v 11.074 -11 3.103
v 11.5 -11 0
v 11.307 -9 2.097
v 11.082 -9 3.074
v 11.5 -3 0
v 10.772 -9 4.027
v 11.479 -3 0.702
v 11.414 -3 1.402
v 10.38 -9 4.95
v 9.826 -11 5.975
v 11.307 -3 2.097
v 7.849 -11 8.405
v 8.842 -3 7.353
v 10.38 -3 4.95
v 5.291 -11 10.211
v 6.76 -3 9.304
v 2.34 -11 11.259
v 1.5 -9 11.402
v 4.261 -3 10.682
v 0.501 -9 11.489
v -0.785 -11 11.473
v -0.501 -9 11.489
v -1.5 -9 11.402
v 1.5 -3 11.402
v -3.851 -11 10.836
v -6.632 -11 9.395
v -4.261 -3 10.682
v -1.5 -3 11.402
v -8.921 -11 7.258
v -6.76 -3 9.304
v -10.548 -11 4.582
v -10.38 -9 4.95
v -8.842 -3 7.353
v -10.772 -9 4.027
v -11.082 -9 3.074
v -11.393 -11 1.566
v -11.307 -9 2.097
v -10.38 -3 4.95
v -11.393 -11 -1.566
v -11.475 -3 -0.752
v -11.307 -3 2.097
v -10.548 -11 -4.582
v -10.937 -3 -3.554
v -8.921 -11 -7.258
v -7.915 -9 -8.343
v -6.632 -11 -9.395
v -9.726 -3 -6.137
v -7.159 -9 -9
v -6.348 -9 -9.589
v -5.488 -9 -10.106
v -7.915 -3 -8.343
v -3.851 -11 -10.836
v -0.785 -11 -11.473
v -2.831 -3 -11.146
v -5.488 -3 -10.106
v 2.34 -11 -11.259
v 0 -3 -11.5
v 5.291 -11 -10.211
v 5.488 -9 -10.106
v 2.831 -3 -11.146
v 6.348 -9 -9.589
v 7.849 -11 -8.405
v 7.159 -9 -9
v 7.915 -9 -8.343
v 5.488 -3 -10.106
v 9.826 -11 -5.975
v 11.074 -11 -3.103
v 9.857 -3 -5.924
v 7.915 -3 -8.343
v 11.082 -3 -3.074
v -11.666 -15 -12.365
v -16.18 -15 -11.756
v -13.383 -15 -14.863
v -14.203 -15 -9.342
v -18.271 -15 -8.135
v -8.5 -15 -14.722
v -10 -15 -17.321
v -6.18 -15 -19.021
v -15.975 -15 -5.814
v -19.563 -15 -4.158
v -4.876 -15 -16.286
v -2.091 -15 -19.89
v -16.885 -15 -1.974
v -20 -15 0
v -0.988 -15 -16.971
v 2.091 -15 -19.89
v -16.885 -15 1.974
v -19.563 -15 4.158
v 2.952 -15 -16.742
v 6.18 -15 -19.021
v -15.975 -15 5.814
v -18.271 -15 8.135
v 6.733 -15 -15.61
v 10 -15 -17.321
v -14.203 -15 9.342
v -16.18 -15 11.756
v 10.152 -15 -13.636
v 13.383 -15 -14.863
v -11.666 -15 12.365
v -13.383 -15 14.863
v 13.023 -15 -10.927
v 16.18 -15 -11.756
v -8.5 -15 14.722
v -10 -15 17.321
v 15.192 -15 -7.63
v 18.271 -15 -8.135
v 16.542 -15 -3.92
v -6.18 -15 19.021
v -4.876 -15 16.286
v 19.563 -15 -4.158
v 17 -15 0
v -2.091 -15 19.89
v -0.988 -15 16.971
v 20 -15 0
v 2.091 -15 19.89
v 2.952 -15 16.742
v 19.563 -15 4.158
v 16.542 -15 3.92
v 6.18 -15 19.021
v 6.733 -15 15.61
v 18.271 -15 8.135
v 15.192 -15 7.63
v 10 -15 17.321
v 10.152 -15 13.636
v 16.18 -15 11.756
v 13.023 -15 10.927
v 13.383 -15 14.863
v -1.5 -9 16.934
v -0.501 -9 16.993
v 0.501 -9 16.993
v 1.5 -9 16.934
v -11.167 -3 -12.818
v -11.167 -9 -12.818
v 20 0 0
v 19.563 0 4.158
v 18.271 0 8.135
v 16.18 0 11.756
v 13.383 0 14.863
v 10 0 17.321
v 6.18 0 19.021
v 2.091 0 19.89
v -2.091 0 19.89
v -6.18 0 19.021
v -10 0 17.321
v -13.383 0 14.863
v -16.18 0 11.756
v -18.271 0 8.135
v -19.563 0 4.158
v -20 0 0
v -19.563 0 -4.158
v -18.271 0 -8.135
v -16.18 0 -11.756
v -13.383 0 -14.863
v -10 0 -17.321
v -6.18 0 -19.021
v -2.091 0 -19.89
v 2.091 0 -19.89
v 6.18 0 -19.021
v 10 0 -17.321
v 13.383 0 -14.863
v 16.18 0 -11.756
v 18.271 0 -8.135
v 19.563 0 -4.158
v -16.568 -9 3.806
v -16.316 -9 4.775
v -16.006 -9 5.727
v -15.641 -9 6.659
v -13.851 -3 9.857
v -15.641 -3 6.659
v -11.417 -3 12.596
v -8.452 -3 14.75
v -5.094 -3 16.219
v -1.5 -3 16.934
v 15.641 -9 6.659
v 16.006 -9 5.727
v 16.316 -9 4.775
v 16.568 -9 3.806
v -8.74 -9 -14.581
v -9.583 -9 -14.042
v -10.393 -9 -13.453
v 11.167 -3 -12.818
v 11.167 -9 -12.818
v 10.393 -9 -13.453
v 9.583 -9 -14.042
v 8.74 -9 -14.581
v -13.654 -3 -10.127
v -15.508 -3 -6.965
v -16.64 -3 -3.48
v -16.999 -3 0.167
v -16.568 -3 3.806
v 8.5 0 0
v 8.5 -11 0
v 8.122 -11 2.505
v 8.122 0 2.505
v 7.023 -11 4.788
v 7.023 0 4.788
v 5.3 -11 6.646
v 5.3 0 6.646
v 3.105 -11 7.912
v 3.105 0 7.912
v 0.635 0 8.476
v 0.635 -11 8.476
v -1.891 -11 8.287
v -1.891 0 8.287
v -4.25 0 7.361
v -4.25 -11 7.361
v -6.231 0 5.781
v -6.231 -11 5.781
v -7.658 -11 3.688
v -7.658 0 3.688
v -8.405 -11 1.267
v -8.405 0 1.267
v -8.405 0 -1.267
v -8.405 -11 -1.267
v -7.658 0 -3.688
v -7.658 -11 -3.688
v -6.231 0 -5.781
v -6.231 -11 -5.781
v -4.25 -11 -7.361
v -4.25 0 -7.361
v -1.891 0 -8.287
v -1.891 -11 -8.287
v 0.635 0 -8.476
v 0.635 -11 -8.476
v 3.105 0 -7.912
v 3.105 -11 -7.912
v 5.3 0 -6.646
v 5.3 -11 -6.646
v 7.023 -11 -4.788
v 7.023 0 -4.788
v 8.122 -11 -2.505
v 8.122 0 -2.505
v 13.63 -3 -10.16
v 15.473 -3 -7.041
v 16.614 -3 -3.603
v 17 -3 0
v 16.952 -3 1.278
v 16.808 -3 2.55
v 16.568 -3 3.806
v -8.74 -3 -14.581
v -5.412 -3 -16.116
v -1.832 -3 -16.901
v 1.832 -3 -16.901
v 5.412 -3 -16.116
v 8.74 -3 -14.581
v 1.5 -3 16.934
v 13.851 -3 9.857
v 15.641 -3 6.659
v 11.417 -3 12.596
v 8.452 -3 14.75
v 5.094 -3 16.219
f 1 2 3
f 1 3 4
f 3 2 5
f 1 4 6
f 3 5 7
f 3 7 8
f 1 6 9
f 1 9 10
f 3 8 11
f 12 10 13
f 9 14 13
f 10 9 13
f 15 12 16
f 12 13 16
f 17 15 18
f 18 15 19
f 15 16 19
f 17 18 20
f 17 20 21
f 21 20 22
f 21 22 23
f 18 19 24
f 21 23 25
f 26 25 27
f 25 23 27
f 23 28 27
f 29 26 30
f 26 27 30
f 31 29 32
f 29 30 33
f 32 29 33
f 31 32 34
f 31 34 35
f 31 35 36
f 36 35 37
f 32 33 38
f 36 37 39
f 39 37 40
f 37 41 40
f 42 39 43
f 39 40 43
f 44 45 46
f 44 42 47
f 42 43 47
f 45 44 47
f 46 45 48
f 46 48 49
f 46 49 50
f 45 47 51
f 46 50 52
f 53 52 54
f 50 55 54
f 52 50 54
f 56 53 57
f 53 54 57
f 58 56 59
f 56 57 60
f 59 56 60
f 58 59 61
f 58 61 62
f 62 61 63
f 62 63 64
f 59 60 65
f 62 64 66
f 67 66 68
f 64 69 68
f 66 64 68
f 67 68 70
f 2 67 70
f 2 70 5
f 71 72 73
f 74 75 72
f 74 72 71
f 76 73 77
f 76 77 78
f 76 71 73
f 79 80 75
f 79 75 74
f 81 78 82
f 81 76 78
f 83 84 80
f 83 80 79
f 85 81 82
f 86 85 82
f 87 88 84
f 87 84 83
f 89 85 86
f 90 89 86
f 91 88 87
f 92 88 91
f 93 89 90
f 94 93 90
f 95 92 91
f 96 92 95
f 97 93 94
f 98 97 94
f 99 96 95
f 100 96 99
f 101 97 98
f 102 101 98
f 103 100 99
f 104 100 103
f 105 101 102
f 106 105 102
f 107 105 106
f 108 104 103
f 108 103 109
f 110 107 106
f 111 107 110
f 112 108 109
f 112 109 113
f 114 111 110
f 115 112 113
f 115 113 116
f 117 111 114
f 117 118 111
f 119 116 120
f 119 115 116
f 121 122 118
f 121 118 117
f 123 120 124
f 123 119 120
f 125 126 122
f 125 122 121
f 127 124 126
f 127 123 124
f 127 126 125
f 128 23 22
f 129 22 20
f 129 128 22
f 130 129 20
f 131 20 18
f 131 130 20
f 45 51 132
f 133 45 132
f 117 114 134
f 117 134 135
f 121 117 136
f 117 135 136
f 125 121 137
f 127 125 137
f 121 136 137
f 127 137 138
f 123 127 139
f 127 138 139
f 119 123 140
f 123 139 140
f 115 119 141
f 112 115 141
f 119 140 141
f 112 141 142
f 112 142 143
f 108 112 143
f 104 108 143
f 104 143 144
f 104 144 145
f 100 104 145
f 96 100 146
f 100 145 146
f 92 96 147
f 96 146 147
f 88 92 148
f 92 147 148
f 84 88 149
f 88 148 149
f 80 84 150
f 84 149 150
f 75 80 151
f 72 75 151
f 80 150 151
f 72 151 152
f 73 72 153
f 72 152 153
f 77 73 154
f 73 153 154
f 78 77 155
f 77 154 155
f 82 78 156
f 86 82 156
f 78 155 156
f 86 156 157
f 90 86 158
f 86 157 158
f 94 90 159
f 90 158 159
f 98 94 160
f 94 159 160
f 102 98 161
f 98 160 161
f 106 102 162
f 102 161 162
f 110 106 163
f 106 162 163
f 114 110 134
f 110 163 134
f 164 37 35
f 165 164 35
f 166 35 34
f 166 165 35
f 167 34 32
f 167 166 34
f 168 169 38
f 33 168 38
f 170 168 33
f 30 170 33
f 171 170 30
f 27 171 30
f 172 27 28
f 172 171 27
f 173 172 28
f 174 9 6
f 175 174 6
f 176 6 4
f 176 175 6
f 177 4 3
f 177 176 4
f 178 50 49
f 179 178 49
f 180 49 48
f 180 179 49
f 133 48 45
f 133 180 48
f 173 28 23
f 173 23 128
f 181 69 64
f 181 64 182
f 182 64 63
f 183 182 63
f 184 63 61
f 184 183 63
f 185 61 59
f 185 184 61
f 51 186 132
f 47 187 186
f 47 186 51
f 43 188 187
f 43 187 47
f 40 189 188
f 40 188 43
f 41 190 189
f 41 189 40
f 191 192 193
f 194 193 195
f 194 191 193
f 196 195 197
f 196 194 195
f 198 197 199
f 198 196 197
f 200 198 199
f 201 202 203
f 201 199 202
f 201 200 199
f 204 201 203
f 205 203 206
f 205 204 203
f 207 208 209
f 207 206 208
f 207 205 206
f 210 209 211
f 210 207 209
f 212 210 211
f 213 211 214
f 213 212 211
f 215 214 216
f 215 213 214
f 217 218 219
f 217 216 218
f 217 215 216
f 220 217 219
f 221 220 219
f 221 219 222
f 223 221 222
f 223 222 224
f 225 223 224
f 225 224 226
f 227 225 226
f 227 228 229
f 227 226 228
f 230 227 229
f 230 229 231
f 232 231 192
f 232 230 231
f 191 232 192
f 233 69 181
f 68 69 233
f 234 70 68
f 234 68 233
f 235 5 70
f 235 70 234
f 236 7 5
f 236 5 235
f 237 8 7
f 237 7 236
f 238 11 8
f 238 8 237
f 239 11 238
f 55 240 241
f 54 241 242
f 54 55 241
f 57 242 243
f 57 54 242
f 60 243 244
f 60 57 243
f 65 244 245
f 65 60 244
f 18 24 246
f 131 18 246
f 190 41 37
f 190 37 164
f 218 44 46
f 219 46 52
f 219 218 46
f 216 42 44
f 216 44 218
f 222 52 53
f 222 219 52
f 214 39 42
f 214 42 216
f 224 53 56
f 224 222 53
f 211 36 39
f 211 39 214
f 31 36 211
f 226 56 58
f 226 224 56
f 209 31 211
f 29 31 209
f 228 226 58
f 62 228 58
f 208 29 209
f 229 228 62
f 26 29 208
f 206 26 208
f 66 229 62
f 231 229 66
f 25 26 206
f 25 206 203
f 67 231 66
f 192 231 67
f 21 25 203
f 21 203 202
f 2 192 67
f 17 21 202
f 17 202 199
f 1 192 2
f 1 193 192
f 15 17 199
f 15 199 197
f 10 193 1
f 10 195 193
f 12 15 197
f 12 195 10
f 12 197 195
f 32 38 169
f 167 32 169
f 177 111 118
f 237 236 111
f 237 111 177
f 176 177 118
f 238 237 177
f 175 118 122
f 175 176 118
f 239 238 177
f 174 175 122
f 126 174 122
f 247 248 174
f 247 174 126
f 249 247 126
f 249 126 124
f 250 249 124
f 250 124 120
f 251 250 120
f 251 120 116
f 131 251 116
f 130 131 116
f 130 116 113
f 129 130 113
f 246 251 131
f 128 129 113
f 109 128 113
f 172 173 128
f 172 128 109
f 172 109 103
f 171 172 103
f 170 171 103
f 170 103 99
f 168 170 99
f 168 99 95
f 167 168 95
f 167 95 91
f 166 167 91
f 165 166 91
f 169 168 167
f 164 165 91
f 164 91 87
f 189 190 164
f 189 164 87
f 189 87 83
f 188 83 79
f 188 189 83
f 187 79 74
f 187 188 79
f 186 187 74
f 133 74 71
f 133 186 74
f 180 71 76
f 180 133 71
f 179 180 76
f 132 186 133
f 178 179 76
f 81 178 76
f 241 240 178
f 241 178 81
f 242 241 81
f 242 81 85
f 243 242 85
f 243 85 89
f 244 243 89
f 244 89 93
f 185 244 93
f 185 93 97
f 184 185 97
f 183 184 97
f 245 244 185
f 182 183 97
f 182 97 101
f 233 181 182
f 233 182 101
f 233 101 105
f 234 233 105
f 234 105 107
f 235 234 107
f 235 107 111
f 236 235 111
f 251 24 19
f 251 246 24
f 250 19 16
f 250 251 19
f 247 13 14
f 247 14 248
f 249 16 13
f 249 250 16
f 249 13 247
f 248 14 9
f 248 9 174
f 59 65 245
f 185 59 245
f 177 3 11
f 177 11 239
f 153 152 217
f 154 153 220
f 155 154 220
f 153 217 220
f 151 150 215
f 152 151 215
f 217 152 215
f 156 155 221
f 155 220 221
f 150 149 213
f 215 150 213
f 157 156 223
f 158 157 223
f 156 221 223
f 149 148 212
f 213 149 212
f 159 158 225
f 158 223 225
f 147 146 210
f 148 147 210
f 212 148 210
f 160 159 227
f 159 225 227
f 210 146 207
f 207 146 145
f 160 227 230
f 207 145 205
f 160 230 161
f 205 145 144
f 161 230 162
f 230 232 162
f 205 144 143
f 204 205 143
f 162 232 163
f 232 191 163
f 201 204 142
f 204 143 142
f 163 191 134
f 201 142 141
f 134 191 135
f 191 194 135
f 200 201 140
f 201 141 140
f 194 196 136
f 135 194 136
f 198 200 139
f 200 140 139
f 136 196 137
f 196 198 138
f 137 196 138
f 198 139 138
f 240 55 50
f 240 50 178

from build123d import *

# Parameters (mm, degrees)
SKETCH_R           = 20
SKETCH_R_2         = 8.5
PAD_DEPTH          = 15
SKETCH001_R        = 17
SKETCH001_R_2      = 11.5
POCKET_DEPTH       = 12.001
SKETCH002_W        = 3
SKETCH002_H        = 8.150041
PAD001_DEPTH       = 6
POLARPATTERN_COUNT = 5
SKETCH003_R        = 11.5
POCKET001_DEPTH    = 4.001


with BuildPart() as part:
    # Sketch → Pad (new body)
    with BuildSketch(Plane.XZ):
        Circle(SKETCH_R)
        Circle(SKETCH_R_2, mode=Mode.SUBTRACT)
    extrude(amount=PAD_DEPTH)

    # Sketch001 → Pocket (cut, through all)
    with BuildSketch(Plane.XZ.offset(3)):
        Circle(SKETCH001_R)
        Circle(SKETCH001_R_2, mode=Mode.SUBTRACT)
    extrude(amount=POCKET_DEPTH, mode=Mode.SUBTRACT)

    # Sketch002 → Pad001 (join)
    with BuildSketch(Plane.XZ.offset(3)):
        with Locations((0, 14.096249)):
            Rectangle(SKETCH002_W, SKETCH002_H)
    pad001 = extrude(amount=PAD001_DEPTH)

    # PolarPattern: Pad001 ×5 about axis
    polarpattern_axis = Axis((0, -3, 0), (0, -1, 0))
    for i in range(1, POLARPATTERN_COUNT):
        add(pad001.rotate(polarpattern_axis, i * 360 / POLARPATTERN_COUNT))

    # Sketch003 → Pocket001 (cut, through all)
    with BuildSketch(Plane.XZ.offset(11)):
        Circle(SKETCH003_R)
    extrude(amount=POCKET001_DEPTH, mode=Mode.SUBTRACT)


solid = part.part
